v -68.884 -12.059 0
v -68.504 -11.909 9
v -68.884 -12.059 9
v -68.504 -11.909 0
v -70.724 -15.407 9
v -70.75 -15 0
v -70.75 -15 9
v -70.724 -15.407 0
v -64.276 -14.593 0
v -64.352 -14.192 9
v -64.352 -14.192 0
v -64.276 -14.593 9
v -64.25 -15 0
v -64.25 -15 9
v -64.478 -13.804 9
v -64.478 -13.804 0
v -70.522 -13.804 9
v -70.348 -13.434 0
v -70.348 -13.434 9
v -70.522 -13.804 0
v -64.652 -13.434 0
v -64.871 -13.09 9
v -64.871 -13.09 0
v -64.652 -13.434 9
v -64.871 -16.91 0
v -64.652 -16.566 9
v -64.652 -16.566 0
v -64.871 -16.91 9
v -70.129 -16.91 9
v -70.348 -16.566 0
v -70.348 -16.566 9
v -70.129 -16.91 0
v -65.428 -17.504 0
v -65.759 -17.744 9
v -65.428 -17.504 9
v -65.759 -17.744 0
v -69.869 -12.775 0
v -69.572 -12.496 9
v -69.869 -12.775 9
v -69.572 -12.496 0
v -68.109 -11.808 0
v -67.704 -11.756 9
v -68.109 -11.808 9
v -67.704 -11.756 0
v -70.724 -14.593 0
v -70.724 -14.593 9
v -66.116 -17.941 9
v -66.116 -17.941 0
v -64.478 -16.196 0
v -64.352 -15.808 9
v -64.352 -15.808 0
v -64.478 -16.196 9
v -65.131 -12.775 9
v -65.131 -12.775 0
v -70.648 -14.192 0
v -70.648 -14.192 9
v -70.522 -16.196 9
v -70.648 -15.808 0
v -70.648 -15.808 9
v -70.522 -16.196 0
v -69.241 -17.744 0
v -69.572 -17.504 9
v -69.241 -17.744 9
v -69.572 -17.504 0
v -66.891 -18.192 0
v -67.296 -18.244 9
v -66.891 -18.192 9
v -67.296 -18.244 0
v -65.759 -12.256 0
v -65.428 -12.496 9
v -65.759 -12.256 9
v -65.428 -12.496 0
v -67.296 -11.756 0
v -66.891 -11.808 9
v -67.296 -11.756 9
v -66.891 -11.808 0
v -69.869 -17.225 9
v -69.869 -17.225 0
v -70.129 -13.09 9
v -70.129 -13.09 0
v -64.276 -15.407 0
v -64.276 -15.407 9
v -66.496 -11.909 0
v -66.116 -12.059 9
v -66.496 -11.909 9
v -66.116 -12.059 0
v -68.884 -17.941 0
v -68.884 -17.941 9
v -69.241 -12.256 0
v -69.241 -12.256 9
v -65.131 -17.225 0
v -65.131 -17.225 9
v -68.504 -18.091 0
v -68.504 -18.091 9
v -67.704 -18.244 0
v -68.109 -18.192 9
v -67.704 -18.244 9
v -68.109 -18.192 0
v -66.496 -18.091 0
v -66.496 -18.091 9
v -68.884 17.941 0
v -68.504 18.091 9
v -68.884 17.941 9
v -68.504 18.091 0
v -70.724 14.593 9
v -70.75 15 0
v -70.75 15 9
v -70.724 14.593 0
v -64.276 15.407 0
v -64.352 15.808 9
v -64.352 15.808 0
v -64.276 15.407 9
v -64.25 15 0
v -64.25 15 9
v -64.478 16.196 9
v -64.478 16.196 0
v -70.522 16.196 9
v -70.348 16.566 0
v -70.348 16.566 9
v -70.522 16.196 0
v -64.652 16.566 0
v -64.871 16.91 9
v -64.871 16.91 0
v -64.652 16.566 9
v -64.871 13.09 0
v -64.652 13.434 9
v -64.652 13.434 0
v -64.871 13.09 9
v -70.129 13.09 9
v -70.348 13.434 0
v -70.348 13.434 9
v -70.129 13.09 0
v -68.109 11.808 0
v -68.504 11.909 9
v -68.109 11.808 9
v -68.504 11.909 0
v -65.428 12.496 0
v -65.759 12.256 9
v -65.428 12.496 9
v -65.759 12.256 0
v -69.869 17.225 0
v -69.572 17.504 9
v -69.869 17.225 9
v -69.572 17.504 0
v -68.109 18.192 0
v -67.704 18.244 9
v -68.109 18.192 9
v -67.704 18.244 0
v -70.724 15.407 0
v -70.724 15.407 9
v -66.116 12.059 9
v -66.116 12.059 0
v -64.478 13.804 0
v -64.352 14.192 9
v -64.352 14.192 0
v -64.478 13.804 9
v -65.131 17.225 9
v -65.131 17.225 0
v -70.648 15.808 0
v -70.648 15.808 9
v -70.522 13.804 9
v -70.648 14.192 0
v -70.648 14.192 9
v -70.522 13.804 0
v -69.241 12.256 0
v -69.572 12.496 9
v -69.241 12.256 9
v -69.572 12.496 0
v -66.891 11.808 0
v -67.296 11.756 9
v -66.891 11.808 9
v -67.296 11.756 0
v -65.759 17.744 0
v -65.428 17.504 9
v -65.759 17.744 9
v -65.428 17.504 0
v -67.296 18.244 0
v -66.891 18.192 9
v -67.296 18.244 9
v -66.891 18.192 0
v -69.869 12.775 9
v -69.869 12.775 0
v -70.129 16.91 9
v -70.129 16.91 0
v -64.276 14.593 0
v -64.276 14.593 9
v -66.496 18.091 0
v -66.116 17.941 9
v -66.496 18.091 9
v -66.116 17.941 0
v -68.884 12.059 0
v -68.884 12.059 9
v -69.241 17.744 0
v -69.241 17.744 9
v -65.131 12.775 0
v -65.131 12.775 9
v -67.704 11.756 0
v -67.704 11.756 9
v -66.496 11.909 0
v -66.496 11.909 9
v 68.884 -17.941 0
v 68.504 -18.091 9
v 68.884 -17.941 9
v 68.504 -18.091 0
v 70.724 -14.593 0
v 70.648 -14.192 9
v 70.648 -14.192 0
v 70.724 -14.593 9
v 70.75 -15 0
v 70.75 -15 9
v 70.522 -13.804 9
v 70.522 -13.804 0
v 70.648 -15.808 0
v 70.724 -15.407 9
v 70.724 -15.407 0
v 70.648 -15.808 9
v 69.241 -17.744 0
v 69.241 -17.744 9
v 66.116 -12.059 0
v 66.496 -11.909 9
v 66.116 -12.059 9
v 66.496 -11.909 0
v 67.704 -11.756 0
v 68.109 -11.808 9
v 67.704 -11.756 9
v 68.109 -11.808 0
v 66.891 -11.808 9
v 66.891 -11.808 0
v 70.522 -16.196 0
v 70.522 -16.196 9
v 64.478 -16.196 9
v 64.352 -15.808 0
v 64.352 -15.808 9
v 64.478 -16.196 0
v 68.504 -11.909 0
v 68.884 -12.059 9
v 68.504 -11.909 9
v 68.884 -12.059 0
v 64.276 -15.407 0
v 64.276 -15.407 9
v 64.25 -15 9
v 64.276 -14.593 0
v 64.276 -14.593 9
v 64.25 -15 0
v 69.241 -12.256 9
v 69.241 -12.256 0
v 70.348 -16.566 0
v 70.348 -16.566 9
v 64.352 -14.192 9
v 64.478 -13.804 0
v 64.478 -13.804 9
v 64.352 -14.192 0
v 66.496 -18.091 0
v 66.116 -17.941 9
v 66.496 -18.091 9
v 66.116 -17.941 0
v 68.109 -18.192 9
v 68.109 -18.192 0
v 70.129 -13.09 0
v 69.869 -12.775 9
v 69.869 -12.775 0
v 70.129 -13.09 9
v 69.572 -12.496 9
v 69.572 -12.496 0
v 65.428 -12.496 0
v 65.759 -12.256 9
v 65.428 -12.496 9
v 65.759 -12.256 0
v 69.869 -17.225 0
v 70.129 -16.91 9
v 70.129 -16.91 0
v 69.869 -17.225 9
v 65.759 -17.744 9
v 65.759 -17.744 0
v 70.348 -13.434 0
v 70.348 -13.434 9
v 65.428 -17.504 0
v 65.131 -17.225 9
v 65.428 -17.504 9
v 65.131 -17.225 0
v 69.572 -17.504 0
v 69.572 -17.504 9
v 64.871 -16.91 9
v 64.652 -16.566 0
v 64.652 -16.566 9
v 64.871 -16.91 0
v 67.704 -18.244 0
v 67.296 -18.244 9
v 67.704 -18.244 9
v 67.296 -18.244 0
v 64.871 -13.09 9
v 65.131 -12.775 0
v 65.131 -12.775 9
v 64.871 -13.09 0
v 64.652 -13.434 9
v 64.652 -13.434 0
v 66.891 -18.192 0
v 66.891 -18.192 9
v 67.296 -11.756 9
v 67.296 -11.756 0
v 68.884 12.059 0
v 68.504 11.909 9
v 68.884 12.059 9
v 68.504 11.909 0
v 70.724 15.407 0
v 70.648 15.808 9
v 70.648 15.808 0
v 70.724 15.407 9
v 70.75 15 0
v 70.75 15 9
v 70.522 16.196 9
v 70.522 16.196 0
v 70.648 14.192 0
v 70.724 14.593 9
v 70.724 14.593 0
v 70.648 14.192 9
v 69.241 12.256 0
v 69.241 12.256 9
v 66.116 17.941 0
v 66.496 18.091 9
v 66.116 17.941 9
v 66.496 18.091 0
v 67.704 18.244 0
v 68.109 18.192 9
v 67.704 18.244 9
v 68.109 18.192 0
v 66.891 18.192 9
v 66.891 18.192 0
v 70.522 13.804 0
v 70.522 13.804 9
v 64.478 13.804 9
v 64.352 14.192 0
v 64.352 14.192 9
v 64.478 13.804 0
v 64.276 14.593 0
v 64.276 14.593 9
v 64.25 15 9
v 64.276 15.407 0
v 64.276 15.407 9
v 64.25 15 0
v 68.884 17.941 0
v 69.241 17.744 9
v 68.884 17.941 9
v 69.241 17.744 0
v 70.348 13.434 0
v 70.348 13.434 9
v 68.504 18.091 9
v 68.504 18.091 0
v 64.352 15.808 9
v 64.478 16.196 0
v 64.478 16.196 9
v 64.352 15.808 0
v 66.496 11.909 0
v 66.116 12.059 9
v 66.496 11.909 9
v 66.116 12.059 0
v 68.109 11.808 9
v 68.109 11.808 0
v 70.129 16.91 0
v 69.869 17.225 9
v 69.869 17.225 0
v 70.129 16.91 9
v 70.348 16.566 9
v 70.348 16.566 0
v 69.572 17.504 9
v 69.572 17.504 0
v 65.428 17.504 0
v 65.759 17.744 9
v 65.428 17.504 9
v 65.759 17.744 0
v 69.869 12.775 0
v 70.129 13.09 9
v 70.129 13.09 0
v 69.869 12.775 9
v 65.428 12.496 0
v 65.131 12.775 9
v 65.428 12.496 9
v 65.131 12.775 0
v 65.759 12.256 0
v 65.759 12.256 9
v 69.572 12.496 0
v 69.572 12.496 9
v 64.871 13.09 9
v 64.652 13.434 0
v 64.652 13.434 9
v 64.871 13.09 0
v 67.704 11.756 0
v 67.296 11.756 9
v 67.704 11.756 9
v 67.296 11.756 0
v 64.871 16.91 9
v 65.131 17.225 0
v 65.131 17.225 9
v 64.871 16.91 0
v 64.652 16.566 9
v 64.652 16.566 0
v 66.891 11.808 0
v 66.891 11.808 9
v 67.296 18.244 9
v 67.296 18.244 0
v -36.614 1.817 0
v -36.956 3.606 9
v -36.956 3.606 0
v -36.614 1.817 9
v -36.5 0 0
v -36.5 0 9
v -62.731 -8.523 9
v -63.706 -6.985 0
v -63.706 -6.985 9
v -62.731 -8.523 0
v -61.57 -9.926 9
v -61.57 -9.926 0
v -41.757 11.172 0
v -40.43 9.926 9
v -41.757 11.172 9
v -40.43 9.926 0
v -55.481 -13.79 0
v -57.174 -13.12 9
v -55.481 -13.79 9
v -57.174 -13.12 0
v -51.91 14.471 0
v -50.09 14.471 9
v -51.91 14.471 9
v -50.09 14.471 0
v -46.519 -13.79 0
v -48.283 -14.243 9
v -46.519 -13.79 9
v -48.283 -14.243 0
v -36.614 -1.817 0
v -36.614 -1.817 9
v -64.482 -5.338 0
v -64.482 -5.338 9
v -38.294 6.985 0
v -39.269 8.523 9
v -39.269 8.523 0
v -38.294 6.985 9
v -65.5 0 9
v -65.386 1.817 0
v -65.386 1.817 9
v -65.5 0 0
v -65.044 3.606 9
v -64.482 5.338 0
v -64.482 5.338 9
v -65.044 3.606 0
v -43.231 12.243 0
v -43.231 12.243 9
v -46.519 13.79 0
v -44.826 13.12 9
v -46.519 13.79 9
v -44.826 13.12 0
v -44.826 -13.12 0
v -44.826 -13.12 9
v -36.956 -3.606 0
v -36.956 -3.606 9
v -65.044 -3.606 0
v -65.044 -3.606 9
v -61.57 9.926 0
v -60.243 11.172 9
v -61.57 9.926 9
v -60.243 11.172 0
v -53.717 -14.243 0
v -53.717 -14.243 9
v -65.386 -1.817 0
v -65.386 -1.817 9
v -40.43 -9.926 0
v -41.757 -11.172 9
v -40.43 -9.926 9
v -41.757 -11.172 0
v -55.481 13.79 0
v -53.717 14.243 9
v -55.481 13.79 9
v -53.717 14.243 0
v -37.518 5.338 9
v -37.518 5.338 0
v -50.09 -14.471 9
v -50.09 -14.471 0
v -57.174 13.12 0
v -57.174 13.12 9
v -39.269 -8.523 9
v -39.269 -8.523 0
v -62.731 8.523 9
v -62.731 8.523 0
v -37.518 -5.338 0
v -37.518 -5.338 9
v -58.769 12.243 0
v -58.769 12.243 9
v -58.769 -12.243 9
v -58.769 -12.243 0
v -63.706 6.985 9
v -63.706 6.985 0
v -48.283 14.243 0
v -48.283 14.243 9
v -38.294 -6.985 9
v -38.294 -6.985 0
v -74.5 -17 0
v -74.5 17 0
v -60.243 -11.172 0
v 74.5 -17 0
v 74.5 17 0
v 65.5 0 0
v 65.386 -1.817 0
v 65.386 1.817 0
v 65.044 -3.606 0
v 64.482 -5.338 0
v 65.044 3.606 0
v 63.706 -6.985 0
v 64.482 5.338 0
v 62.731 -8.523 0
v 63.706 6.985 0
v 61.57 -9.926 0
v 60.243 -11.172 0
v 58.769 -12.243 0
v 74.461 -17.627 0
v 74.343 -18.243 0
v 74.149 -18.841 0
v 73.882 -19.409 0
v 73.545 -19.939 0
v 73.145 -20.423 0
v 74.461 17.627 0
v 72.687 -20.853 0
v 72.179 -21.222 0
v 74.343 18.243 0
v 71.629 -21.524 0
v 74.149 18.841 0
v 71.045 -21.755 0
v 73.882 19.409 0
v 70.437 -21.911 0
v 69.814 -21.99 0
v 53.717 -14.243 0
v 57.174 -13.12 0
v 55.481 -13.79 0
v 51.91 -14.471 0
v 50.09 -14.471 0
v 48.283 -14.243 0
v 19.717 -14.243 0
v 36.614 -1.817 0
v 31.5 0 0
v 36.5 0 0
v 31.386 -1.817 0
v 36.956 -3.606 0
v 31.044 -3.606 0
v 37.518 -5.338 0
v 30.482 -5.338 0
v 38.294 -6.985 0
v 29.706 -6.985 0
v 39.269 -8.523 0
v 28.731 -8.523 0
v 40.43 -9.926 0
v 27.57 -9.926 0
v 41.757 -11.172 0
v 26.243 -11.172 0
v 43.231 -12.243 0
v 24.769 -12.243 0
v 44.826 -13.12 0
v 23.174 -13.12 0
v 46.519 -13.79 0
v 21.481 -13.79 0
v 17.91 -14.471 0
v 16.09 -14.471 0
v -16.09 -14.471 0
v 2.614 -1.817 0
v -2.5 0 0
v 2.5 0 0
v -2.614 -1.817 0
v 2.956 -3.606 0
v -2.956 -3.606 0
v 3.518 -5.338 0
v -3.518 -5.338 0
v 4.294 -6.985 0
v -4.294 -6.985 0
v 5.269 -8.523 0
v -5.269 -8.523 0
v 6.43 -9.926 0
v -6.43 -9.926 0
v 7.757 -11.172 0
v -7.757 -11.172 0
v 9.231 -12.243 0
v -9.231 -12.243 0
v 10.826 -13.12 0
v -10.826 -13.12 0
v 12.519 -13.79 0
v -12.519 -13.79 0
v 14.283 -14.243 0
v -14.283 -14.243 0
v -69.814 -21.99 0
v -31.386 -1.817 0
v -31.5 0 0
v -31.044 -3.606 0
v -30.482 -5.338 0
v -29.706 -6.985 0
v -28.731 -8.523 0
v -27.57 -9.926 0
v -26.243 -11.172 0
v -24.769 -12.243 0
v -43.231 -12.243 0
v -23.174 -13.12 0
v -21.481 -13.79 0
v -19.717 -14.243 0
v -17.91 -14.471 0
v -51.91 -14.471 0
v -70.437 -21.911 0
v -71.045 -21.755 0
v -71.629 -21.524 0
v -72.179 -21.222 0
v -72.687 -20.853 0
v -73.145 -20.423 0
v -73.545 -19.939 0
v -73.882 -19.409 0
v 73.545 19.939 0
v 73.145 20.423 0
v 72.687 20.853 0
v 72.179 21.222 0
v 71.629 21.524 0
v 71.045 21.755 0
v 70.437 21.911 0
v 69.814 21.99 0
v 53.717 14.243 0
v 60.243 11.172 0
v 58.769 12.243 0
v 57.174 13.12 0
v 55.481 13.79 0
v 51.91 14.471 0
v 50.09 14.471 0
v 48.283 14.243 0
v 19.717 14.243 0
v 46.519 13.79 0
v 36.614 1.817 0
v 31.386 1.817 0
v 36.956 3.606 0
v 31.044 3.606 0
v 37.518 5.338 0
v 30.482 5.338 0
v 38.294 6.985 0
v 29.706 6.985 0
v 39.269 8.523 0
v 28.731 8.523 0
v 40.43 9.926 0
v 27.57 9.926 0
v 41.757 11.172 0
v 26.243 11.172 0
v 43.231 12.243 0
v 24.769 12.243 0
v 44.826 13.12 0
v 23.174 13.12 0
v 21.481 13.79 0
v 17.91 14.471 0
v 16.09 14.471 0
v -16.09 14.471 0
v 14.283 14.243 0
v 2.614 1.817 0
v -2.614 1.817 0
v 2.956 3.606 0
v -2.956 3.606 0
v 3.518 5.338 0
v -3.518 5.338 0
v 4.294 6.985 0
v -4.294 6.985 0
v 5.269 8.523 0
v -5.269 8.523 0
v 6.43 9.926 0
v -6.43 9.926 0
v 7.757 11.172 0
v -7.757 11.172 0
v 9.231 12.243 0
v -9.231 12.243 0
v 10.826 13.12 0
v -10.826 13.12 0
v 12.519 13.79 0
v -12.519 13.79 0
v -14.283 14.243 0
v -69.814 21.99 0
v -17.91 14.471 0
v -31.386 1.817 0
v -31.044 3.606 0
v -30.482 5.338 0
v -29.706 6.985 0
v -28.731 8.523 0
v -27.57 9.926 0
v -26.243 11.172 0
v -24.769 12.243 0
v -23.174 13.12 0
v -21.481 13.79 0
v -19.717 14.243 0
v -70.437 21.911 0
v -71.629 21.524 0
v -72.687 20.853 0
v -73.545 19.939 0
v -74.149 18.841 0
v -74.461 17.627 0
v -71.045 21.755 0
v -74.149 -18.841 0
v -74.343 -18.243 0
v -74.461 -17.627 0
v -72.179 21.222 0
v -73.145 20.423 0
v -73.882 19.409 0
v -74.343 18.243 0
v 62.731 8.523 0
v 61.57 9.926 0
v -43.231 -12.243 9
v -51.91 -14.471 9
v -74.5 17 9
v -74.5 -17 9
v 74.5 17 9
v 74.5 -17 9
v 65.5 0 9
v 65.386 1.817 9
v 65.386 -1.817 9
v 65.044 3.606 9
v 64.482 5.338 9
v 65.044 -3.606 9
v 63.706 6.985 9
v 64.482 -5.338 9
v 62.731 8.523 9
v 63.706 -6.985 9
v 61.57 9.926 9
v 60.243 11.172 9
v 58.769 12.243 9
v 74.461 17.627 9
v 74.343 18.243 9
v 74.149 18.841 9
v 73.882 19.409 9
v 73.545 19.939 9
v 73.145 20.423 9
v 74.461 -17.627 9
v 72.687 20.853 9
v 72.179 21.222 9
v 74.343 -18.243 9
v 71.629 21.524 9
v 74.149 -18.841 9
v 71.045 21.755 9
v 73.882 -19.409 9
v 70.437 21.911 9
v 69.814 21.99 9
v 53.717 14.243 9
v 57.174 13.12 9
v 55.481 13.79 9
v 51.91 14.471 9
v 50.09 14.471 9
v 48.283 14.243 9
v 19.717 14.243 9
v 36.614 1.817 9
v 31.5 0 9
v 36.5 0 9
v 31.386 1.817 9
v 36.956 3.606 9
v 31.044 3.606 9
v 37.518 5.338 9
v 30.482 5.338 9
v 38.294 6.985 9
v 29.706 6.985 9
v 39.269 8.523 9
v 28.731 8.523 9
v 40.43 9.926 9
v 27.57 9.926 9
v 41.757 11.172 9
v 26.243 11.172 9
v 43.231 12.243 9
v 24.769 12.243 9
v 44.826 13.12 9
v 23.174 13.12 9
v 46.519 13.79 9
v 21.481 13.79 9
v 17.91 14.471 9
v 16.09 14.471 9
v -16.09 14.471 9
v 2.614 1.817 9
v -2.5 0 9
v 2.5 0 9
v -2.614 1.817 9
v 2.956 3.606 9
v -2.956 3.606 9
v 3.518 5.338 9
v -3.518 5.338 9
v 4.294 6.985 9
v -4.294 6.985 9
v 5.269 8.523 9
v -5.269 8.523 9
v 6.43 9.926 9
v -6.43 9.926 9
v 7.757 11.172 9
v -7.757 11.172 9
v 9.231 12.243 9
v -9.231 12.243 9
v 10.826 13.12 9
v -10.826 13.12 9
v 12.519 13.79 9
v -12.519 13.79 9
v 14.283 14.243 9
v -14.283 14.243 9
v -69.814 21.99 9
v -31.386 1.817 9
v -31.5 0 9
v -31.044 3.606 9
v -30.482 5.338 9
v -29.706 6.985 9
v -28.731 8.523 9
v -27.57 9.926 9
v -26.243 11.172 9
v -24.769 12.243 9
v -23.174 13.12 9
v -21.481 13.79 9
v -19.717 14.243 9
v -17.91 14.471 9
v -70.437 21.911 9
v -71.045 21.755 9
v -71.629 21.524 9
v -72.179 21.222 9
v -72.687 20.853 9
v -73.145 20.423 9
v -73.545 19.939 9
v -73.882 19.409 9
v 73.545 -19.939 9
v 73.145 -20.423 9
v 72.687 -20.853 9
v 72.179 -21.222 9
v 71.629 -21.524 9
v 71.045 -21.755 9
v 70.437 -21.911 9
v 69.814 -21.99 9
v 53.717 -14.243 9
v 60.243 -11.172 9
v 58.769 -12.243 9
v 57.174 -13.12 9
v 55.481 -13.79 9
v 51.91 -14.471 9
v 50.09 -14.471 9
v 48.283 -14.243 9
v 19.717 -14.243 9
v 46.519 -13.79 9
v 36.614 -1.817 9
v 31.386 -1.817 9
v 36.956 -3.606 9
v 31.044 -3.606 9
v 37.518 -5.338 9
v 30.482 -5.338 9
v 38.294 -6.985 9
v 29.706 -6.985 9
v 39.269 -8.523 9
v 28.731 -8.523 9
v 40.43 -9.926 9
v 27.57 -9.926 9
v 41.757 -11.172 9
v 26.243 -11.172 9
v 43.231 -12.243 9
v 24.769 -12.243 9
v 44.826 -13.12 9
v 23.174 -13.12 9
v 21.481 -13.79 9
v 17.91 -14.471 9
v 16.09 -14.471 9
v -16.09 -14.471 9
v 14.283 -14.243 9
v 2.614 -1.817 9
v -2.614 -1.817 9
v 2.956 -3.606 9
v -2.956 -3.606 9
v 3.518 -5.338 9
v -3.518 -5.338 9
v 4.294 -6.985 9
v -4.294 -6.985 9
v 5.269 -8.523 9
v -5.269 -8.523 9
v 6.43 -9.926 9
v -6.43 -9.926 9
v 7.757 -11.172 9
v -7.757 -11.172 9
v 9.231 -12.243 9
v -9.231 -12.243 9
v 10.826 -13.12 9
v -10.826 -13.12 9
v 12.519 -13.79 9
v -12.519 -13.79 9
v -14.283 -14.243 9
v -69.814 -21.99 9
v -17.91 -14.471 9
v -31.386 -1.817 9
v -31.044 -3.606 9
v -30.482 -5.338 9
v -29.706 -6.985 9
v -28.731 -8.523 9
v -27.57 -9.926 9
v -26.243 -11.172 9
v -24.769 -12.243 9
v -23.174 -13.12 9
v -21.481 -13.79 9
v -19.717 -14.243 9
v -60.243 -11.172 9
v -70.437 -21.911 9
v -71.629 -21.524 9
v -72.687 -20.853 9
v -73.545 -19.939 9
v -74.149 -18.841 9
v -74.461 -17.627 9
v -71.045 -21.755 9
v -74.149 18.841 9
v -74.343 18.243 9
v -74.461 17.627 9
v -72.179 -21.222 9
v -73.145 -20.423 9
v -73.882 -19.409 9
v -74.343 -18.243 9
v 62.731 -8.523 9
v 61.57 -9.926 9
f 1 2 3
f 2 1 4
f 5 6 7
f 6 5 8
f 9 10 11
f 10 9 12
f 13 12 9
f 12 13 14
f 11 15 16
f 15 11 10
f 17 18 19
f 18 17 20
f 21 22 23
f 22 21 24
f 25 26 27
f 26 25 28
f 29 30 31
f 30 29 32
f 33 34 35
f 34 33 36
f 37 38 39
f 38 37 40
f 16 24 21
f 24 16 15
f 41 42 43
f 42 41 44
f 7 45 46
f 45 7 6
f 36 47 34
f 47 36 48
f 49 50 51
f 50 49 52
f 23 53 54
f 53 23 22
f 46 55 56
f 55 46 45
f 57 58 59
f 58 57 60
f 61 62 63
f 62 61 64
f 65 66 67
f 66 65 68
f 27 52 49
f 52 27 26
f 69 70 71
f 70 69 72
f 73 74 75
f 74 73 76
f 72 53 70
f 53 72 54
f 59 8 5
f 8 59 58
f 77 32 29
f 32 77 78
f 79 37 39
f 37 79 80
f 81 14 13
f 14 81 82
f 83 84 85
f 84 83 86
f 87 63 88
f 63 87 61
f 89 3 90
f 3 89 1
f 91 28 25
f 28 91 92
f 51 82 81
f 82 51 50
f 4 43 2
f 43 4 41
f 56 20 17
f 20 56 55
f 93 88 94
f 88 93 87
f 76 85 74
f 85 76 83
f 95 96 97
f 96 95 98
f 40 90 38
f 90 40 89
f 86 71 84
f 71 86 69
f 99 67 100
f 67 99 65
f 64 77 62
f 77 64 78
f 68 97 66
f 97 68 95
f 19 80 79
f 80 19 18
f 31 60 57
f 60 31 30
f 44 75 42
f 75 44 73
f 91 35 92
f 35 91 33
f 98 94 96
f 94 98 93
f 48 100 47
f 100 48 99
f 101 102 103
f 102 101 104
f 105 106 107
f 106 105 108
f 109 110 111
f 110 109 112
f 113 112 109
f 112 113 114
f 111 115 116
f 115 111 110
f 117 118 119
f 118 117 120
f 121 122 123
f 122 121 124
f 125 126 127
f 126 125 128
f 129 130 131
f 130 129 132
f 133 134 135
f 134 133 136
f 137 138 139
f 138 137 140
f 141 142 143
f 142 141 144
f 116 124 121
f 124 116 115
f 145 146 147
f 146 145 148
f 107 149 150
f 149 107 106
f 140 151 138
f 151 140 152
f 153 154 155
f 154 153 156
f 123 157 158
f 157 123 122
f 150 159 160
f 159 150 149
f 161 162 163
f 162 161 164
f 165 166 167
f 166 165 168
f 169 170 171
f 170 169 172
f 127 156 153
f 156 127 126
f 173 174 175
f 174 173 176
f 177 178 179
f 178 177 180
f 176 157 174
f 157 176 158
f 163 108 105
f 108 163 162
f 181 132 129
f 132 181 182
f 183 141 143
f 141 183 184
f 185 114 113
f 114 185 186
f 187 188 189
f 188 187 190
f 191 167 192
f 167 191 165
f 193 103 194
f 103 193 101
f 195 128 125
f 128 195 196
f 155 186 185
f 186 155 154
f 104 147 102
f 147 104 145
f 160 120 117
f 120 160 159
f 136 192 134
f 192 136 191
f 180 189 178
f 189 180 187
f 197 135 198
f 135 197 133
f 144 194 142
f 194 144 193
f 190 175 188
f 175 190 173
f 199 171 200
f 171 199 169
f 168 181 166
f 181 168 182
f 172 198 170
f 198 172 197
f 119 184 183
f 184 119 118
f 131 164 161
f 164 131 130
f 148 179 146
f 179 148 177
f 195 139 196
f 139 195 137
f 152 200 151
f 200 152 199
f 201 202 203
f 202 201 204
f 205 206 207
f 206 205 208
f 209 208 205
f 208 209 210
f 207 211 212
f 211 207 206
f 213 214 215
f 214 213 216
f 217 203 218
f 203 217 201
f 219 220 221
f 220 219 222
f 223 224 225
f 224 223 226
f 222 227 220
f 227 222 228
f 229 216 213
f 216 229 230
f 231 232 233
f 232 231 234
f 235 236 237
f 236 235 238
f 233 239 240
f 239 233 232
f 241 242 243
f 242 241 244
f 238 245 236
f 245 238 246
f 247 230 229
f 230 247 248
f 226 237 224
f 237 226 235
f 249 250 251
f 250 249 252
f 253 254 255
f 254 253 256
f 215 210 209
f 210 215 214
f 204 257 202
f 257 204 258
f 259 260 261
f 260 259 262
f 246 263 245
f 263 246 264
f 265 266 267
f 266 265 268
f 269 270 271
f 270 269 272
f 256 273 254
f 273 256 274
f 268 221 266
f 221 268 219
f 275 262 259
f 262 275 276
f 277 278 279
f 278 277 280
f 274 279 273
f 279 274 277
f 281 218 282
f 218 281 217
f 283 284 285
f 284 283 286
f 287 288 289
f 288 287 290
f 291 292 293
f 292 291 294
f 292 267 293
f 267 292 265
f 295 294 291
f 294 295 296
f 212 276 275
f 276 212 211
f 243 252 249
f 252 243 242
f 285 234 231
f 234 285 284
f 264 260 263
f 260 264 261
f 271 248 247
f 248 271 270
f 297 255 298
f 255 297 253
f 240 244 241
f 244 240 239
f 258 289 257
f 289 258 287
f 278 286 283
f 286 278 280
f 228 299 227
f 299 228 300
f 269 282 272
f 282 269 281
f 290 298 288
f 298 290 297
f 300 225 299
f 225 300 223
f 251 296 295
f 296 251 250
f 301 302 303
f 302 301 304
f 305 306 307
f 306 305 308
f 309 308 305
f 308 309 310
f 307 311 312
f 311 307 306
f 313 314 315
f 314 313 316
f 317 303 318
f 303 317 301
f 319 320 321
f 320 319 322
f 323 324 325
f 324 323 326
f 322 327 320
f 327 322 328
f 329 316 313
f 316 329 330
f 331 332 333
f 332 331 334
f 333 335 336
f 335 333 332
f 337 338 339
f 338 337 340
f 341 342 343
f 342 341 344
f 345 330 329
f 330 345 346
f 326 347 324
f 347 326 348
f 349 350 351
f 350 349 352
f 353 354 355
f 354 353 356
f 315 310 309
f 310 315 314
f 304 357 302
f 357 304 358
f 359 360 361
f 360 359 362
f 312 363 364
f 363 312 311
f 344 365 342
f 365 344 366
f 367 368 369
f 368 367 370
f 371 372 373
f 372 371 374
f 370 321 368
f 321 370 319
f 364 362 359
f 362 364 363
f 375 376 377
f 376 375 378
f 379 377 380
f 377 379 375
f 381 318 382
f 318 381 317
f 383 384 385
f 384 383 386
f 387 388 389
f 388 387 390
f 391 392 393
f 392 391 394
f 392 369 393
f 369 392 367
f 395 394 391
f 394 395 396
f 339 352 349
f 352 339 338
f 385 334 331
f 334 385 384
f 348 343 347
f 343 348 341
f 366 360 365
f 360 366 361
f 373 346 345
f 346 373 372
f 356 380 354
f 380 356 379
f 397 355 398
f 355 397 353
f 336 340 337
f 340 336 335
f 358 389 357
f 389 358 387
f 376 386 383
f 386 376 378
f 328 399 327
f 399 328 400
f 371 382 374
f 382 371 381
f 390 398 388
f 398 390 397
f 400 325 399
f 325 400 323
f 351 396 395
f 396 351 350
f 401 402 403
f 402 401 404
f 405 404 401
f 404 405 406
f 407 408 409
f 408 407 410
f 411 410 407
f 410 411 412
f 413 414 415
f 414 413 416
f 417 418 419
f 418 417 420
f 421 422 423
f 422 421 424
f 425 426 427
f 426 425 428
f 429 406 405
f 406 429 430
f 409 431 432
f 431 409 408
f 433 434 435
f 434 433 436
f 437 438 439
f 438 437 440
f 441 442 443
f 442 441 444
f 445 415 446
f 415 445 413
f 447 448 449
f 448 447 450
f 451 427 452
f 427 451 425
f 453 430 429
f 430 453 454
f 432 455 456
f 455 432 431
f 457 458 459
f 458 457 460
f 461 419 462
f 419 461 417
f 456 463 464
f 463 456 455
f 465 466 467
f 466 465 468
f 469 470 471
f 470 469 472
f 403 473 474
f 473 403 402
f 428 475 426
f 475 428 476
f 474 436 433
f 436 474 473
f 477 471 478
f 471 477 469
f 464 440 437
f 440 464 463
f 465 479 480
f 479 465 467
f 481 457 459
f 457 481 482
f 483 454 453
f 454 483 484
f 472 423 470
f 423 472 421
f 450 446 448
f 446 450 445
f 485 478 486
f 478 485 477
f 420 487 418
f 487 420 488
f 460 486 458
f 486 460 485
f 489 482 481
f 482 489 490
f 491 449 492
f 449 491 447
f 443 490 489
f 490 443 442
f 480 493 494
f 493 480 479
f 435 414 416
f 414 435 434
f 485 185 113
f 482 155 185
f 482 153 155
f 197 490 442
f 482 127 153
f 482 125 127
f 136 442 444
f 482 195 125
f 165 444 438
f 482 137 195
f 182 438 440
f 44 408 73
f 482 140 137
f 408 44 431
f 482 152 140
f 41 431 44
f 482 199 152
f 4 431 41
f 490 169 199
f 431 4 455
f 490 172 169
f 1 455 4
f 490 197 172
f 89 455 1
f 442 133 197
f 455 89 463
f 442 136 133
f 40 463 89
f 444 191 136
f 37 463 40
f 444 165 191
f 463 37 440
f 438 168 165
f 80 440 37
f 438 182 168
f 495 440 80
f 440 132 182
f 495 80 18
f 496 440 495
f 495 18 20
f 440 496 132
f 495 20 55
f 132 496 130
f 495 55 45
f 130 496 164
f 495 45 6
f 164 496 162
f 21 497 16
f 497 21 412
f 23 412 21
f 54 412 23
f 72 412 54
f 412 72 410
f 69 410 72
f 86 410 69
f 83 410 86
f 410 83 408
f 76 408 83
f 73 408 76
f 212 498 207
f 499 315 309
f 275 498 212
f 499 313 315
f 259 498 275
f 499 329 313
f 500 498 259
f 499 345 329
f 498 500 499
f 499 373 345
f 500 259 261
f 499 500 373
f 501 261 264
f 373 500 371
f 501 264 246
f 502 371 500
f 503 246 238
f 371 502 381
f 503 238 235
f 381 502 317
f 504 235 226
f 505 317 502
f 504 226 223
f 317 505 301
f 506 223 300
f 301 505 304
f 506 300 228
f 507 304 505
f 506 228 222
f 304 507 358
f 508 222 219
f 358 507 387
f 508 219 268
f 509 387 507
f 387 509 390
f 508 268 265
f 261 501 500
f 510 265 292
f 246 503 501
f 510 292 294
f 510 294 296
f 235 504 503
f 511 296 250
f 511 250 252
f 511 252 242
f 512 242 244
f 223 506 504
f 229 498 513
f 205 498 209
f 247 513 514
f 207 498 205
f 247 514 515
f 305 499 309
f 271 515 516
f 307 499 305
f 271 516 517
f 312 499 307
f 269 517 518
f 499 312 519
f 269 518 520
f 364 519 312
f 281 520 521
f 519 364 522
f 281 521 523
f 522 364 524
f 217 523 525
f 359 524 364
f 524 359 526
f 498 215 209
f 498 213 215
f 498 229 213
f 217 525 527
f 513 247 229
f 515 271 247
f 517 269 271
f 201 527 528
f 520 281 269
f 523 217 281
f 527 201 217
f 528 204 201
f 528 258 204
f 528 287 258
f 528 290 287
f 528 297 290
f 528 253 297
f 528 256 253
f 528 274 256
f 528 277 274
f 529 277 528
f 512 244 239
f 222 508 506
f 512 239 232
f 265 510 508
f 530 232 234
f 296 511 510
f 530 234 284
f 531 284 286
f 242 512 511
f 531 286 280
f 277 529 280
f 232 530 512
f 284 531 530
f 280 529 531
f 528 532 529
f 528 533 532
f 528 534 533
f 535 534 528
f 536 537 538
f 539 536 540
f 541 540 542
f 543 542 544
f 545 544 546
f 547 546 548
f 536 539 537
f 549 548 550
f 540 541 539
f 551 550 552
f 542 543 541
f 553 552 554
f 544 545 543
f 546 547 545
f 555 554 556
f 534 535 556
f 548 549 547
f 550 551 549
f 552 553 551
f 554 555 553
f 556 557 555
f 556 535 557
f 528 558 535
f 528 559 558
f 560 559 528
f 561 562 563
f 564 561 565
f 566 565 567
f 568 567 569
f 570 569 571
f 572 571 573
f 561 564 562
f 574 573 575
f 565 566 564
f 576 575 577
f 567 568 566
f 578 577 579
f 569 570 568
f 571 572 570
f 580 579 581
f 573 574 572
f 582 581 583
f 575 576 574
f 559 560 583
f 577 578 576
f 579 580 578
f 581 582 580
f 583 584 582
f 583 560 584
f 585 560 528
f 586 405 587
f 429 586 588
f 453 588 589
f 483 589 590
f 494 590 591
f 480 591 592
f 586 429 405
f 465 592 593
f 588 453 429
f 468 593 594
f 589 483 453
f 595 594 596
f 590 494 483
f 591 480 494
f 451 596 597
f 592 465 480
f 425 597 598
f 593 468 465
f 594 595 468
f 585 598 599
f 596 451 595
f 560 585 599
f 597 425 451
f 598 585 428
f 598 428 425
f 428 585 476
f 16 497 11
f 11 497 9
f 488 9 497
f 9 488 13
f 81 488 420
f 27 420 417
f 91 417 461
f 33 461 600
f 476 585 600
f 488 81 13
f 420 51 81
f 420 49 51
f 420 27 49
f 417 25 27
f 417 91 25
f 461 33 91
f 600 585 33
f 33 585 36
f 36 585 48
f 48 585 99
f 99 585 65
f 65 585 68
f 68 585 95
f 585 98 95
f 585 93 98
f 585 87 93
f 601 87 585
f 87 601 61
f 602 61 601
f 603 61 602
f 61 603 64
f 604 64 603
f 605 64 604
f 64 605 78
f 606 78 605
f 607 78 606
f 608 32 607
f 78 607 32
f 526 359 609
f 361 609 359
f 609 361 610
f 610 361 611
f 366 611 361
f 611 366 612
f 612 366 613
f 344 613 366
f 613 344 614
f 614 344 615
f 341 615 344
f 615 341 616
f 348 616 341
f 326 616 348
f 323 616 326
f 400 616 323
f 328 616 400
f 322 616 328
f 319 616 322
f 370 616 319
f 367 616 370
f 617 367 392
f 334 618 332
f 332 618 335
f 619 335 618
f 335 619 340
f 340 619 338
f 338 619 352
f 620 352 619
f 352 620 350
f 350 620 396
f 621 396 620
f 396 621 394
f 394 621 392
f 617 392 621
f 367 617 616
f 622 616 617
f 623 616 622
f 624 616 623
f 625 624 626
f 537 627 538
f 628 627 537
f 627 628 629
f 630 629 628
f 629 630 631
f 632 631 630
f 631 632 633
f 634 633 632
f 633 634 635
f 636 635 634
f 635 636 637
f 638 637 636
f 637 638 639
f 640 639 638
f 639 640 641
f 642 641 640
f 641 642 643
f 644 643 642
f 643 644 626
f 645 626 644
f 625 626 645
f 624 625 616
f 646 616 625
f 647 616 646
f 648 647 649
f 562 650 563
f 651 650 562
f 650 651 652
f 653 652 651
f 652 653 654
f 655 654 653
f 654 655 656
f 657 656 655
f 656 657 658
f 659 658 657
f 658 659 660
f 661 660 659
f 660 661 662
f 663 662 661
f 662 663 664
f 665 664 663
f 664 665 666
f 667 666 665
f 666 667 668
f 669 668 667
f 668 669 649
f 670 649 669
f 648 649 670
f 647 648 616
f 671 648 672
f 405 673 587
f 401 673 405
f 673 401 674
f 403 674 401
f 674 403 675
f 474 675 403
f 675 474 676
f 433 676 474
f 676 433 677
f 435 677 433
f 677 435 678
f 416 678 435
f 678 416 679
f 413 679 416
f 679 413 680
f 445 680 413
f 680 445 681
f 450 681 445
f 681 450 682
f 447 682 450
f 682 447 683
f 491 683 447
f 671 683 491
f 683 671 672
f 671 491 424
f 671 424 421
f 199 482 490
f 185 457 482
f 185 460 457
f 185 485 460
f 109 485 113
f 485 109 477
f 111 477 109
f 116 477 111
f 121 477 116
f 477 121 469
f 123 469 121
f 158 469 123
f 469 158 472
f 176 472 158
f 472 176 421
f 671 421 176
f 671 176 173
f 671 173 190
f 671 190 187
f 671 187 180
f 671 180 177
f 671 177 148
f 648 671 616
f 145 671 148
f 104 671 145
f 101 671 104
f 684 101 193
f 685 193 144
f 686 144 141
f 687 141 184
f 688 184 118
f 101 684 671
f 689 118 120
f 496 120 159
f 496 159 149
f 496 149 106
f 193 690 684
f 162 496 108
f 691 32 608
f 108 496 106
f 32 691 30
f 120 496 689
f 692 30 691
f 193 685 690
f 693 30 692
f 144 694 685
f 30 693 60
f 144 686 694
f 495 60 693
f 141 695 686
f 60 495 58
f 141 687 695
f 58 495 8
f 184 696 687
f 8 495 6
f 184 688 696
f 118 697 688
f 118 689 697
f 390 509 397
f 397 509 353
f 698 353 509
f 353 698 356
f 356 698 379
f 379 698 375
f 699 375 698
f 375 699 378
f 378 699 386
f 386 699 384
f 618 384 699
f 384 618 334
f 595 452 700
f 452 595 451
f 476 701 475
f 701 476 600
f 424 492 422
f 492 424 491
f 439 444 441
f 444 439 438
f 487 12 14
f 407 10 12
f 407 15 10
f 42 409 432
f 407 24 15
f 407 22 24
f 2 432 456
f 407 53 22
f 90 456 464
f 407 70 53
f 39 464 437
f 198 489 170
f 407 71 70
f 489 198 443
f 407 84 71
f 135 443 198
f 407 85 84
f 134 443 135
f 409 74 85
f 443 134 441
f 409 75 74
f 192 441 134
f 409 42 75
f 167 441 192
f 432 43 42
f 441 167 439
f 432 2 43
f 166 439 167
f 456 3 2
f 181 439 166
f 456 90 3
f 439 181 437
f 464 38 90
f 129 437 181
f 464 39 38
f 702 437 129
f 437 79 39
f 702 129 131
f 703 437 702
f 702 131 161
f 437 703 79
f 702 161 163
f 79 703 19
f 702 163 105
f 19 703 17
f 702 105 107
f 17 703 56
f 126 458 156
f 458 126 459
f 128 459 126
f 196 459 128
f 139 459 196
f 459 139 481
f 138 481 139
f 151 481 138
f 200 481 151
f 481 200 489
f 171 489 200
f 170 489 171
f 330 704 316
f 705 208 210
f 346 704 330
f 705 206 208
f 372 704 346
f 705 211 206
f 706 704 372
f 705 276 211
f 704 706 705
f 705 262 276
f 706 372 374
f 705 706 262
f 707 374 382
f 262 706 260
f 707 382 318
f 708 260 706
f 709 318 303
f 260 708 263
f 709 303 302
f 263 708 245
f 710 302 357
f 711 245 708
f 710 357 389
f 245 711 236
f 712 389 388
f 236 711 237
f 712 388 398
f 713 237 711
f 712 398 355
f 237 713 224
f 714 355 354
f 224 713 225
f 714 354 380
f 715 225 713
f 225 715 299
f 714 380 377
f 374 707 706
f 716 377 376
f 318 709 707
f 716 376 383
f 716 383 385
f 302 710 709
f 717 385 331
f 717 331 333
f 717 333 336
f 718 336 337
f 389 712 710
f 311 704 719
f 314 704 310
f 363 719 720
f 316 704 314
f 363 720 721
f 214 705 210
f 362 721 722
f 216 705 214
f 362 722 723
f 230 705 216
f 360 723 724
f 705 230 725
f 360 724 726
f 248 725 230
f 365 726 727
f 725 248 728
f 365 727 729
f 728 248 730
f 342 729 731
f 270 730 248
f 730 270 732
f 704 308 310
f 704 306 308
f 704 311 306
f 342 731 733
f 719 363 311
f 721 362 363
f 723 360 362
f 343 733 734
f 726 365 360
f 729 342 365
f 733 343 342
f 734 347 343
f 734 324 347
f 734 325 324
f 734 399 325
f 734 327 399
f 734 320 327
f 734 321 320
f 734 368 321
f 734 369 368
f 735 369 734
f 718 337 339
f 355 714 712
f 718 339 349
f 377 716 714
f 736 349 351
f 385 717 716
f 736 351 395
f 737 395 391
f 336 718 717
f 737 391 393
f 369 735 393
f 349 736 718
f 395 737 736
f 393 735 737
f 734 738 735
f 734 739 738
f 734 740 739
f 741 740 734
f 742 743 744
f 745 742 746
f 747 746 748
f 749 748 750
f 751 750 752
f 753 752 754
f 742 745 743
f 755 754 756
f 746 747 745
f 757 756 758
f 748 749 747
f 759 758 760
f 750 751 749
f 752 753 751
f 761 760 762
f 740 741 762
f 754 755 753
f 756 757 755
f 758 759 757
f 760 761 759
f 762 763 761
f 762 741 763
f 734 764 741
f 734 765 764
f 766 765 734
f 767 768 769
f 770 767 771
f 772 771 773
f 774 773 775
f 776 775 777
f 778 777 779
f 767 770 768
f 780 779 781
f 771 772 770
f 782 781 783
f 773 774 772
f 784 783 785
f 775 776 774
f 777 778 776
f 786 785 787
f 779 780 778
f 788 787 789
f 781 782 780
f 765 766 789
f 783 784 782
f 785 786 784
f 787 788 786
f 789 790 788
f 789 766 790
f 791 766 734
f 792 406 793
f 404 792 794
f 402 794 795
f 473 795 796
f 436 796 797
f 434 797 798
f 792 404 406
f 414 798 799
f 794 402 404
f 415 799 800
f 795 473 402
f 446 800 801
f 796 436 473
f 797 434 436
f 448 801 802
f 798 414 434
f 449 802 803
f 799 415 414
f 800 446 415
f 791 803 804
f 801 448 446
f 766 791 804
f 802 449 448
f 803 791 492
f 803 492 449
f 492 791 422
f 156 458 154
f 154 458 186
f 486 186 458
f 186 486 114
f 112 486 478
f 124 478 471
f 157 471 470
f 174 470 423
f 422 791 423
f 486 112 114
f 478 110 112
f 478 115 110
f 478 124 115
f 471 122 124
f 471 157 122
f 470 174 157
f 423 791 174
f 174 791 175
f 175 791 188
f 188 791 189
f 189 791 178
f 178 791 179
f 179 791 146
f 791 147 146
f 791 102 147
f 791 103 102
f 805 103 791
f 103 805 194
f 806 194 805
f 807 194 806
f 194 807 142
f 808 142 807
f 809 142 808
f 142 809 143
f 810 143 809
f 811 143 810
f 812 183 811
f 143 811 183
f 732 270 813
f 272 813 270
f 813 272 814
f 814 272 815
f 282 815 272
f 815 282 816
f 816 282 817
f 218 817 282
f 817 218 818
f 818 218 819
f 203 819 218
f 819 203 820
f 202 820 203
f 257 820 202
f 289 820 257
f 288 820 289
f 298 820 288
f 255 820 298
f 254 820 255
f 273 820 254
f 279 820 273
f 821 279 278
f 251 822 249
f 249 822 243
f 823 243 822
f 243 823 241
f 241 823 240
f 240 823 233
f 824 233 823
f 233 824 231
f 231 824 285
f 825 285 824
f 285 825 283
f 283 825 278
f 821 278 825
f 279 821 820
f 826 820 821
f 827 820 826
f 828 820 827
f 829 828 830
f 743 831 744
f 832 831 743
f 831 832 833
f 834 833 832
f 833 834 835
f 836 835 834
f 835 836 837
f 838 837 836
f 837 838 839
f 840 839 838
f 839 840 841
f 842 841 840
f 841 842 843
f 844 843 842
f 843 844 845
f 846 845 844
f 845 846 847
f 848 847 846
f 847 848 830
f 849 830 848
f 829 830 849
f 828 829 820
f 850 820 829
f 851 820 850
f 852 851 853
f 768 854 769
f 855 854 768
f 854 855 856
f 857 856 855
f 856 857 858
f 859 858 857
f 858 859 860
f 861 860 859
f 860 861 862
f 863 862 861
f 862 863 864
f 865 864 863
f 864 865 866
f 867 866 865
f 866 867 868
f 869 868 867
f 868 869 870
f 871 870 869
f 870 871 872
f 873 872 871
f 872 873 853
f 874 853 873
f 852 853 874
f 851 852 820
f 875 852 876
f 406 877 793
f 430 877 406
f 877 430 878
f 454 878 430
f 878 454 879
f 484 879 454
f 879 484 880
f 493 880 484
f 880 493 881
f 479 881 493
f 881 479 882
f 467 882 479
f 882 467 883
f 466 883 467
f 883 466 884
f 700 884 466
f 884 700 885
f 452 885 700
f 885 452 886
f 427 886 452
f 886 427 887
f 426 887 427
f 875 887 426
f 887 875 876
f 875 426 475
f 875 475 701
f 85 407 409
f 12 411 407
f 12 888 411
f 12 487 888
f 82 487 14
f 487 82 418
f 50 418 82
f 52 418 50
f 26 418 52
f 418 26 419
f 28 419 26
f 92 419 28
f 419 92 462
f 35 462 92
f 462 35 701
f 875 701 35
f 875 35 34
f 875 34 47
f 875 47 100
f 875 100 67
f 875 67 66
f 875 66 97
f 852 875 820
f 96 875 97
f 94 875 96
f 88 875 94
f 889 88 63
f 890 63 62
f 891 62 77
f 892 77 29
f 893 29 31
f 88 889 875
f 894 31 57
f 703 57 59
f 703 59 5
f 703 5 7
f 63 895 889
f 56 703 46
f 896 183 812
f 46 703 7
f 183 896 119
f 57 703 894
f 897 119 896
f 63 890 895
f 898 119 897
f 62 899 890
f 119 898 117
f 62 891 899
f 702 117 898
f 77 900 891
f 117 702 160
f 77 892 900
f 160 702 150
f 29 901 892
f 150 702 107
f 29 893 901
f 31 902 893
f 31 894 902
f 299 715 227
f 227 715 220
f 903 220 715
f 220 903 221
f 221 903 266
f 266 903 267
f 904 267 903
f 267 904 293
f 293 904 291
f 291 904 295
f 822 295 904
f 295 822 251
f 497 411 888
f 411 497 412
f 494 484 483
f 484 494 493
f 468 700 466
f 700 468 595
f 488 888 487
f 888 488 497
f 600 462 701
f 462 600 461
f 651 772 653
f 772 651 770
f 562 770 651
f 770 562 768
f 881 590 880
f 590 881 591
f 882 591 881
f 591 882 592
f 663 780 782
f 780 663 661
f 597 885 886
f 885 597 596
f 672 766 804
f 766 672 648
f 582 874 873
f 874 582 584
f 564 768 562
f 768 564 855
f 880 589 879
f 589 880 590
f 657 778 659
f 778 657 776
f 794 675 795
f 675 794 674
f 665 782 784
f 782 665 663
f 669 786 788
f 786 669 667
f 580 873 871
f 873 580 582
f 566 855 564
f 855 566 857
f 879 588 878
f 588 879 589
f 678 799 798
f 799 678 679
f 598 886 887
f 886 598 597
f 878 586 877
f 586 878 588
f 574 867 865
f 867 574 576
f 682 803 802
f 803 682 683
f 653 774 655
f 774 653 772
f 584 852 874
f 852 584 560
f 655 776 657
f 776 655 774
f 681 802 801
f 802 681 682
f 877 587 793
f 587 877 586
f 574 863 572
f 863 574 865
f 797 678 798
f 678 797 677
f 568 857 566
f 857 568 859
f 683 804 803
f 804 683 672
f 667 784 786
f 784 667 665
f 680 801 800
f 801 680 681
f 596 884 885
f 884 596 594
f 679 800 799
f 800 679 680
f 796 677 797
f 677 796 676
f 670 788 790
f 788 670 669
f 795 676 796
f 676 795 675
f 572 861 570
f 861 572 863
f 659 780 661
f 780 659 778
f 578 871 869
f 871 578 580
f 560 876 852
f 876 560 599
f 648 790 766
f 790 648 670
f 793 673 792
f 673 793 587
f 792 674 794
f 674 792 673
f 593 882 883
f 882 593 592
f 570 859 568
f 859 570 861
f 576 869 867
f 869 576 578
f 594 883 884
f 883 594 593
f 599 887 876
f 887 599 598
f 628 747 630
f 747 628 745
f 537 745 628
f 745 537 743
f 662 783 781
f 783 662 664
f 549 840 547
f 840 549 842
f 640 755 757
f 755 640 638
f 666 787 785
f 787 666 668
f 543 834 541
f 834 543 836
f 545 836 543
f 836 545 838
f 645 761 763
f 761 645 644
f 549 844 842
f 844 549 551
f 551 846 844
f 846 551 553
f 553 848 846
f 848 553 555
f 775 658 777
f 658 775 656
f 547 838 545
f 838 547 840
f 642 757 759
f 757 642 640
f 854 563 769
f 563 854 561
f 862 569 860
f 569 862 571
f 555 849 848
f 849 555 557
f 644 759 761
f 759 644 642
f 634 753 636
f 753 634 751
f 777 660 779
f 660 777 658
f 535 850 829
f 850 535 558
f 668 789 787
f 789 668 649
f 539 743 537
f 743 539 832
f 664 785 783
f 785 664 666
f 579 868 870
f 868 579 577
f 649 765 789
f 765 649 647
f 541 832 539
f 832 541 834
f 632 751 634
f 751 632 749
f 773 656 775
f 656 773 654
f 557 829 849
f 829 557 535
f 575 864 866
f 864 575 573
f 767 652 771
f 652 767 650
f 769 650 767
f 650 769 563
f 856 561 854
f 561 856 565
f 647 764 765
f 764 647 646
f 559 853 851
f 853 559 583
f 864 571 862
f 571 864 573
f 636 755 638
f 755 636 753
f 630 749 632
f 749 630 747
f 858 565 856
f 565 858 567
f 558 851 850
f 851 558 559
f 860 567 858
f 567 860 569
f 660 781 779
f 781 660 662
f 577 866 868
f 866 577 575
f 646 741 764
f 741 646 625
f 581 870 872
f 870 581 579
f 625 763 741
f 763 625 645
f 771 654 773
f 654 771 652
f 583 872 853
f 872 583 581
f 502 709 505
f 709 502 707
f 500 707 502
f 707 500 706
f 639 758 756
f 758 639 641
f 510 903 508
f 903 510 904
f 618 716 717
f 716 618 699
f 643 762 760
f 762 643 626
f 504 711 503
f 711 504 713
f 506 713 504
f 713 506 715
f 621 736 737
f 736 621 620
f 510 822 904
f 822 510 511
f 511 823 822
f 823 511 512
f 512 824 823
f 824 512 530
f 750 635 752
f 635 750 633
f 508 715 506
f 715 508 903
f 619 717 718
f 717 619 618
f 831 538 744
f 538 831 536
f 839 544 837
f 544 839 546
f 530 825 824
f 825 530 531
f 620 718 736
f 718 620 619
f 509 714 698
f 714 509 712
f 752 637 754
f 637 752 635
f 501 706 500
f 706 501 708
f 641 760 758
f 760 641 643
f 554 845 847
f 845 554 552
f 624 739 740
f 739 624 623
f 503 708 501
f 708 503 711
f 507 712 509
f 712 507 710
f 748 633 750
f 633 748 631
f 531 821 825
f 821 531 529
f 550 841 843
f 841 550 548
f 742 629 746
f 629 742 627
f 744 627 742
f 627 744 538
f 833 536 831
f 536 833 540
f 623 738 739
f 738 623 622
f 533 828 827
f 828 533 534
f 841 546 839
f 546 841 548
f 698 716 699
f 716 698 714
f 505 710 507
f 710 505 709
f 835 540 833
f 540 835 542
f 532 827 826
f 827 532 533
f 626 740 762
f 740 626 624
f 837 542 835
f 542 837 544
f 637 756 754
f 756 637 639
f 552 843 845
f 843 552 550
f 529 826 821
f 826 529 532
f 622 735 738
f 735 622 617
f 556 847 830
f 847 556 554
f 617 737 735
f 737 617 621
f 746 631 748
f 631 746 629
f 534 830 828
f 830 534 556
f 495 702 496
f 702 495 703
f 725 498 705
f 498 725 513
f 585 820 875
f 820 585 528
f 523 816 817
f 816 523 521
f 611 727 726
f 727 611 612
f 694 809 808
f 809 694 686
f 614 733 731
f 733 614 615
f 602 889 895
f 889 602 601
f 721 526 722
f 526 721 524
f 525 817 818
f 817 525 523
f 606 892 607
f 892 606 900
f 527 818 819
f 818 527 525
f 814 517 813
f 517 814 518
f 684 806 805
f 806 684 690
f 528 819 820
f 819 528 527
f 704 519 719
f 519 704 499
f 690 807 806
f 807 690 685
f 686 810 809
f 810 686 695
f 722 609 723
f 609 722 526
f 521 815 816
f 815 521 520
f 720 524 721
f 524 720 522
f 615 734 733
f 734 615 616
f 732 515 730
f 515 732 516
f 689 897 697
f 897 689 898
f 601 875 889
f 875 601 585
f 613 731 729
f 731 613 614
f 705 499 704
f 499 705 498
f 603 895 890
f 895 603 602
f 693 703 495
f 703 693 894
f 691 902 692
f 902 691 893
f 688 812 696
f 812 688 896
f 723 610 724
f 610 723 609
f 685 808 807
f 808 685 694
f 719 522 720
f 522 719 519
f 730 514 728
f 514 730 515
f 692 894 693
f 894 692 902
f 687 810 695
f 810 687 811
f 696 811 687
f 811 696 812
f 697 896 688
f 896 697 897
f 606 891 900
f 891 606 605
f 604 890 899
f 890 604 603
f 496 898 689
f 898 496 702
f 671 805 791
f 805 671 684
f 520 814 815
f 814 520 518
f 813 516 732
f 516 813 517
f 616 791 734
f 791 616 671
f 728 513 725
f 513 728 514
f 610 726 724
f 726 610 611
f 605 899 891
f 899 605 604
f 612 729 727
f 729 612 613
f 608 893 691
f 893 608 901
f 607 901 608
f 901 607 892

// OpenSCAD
$fn = 50;


difference() {
	union() {
		hull() {
			translate(v = [-69.5000000000, 17.0000000000, 0]) {
				cylinder(h = 9, r = 5);
			}
			translate(v = [69.5000000000, 17.0000000000, 0]) {
				cylinder(h = 9, r = 5);
			}
			translate(v = [-69.5000000000, -17.0000000000, 0]) {
				cylinder(h = 9, r = 5);
			}
			translate(v = [69.5000000000, -17.0000000000, 0]) {
				cylinder(h = 9, r = 5);
			}
		}
	}
	union() {
		#translate(v = [-67.5000000000, -15.0000000000, -100.0000000000]) {
			cylinder(h = 200, r = 3.2500000000);
		}
		#translate(v = [-67.5000000000, 15.0000000000, -100.0000000000]) {
			cylinder(h = 200, r = 3.2500000000);
		}
		#translate(v = [67.5000000000, -15.0000000000, -100.0000000000]) {
			cylinder(h = 200, r = 3.2500000000);
		}
		#translate(v = [67.5000000000, 15.0000000000, -100.0000000000]) {
			cylinder(h = 200, r = 3.2500000000);
		}
		#translate(v = [-51.0000000000, 0, 0]) {
			cylinder(h = 9, r = 14.5000000000);
		}
		#translate(v = [-17.0000000000, 0, 0]) {
			cylinder(h = 9, r = 14.5000000000);
		}
		#translate(v = [17.0000000000, 0, 0]) {
			cylinder(h = 9, r = 14.5000000000);
		}
		#translate(v = [51.0000000000, 0, 0]) {
			cylinder(h = 9, r = 14.5000000000);
		}
	}
}
